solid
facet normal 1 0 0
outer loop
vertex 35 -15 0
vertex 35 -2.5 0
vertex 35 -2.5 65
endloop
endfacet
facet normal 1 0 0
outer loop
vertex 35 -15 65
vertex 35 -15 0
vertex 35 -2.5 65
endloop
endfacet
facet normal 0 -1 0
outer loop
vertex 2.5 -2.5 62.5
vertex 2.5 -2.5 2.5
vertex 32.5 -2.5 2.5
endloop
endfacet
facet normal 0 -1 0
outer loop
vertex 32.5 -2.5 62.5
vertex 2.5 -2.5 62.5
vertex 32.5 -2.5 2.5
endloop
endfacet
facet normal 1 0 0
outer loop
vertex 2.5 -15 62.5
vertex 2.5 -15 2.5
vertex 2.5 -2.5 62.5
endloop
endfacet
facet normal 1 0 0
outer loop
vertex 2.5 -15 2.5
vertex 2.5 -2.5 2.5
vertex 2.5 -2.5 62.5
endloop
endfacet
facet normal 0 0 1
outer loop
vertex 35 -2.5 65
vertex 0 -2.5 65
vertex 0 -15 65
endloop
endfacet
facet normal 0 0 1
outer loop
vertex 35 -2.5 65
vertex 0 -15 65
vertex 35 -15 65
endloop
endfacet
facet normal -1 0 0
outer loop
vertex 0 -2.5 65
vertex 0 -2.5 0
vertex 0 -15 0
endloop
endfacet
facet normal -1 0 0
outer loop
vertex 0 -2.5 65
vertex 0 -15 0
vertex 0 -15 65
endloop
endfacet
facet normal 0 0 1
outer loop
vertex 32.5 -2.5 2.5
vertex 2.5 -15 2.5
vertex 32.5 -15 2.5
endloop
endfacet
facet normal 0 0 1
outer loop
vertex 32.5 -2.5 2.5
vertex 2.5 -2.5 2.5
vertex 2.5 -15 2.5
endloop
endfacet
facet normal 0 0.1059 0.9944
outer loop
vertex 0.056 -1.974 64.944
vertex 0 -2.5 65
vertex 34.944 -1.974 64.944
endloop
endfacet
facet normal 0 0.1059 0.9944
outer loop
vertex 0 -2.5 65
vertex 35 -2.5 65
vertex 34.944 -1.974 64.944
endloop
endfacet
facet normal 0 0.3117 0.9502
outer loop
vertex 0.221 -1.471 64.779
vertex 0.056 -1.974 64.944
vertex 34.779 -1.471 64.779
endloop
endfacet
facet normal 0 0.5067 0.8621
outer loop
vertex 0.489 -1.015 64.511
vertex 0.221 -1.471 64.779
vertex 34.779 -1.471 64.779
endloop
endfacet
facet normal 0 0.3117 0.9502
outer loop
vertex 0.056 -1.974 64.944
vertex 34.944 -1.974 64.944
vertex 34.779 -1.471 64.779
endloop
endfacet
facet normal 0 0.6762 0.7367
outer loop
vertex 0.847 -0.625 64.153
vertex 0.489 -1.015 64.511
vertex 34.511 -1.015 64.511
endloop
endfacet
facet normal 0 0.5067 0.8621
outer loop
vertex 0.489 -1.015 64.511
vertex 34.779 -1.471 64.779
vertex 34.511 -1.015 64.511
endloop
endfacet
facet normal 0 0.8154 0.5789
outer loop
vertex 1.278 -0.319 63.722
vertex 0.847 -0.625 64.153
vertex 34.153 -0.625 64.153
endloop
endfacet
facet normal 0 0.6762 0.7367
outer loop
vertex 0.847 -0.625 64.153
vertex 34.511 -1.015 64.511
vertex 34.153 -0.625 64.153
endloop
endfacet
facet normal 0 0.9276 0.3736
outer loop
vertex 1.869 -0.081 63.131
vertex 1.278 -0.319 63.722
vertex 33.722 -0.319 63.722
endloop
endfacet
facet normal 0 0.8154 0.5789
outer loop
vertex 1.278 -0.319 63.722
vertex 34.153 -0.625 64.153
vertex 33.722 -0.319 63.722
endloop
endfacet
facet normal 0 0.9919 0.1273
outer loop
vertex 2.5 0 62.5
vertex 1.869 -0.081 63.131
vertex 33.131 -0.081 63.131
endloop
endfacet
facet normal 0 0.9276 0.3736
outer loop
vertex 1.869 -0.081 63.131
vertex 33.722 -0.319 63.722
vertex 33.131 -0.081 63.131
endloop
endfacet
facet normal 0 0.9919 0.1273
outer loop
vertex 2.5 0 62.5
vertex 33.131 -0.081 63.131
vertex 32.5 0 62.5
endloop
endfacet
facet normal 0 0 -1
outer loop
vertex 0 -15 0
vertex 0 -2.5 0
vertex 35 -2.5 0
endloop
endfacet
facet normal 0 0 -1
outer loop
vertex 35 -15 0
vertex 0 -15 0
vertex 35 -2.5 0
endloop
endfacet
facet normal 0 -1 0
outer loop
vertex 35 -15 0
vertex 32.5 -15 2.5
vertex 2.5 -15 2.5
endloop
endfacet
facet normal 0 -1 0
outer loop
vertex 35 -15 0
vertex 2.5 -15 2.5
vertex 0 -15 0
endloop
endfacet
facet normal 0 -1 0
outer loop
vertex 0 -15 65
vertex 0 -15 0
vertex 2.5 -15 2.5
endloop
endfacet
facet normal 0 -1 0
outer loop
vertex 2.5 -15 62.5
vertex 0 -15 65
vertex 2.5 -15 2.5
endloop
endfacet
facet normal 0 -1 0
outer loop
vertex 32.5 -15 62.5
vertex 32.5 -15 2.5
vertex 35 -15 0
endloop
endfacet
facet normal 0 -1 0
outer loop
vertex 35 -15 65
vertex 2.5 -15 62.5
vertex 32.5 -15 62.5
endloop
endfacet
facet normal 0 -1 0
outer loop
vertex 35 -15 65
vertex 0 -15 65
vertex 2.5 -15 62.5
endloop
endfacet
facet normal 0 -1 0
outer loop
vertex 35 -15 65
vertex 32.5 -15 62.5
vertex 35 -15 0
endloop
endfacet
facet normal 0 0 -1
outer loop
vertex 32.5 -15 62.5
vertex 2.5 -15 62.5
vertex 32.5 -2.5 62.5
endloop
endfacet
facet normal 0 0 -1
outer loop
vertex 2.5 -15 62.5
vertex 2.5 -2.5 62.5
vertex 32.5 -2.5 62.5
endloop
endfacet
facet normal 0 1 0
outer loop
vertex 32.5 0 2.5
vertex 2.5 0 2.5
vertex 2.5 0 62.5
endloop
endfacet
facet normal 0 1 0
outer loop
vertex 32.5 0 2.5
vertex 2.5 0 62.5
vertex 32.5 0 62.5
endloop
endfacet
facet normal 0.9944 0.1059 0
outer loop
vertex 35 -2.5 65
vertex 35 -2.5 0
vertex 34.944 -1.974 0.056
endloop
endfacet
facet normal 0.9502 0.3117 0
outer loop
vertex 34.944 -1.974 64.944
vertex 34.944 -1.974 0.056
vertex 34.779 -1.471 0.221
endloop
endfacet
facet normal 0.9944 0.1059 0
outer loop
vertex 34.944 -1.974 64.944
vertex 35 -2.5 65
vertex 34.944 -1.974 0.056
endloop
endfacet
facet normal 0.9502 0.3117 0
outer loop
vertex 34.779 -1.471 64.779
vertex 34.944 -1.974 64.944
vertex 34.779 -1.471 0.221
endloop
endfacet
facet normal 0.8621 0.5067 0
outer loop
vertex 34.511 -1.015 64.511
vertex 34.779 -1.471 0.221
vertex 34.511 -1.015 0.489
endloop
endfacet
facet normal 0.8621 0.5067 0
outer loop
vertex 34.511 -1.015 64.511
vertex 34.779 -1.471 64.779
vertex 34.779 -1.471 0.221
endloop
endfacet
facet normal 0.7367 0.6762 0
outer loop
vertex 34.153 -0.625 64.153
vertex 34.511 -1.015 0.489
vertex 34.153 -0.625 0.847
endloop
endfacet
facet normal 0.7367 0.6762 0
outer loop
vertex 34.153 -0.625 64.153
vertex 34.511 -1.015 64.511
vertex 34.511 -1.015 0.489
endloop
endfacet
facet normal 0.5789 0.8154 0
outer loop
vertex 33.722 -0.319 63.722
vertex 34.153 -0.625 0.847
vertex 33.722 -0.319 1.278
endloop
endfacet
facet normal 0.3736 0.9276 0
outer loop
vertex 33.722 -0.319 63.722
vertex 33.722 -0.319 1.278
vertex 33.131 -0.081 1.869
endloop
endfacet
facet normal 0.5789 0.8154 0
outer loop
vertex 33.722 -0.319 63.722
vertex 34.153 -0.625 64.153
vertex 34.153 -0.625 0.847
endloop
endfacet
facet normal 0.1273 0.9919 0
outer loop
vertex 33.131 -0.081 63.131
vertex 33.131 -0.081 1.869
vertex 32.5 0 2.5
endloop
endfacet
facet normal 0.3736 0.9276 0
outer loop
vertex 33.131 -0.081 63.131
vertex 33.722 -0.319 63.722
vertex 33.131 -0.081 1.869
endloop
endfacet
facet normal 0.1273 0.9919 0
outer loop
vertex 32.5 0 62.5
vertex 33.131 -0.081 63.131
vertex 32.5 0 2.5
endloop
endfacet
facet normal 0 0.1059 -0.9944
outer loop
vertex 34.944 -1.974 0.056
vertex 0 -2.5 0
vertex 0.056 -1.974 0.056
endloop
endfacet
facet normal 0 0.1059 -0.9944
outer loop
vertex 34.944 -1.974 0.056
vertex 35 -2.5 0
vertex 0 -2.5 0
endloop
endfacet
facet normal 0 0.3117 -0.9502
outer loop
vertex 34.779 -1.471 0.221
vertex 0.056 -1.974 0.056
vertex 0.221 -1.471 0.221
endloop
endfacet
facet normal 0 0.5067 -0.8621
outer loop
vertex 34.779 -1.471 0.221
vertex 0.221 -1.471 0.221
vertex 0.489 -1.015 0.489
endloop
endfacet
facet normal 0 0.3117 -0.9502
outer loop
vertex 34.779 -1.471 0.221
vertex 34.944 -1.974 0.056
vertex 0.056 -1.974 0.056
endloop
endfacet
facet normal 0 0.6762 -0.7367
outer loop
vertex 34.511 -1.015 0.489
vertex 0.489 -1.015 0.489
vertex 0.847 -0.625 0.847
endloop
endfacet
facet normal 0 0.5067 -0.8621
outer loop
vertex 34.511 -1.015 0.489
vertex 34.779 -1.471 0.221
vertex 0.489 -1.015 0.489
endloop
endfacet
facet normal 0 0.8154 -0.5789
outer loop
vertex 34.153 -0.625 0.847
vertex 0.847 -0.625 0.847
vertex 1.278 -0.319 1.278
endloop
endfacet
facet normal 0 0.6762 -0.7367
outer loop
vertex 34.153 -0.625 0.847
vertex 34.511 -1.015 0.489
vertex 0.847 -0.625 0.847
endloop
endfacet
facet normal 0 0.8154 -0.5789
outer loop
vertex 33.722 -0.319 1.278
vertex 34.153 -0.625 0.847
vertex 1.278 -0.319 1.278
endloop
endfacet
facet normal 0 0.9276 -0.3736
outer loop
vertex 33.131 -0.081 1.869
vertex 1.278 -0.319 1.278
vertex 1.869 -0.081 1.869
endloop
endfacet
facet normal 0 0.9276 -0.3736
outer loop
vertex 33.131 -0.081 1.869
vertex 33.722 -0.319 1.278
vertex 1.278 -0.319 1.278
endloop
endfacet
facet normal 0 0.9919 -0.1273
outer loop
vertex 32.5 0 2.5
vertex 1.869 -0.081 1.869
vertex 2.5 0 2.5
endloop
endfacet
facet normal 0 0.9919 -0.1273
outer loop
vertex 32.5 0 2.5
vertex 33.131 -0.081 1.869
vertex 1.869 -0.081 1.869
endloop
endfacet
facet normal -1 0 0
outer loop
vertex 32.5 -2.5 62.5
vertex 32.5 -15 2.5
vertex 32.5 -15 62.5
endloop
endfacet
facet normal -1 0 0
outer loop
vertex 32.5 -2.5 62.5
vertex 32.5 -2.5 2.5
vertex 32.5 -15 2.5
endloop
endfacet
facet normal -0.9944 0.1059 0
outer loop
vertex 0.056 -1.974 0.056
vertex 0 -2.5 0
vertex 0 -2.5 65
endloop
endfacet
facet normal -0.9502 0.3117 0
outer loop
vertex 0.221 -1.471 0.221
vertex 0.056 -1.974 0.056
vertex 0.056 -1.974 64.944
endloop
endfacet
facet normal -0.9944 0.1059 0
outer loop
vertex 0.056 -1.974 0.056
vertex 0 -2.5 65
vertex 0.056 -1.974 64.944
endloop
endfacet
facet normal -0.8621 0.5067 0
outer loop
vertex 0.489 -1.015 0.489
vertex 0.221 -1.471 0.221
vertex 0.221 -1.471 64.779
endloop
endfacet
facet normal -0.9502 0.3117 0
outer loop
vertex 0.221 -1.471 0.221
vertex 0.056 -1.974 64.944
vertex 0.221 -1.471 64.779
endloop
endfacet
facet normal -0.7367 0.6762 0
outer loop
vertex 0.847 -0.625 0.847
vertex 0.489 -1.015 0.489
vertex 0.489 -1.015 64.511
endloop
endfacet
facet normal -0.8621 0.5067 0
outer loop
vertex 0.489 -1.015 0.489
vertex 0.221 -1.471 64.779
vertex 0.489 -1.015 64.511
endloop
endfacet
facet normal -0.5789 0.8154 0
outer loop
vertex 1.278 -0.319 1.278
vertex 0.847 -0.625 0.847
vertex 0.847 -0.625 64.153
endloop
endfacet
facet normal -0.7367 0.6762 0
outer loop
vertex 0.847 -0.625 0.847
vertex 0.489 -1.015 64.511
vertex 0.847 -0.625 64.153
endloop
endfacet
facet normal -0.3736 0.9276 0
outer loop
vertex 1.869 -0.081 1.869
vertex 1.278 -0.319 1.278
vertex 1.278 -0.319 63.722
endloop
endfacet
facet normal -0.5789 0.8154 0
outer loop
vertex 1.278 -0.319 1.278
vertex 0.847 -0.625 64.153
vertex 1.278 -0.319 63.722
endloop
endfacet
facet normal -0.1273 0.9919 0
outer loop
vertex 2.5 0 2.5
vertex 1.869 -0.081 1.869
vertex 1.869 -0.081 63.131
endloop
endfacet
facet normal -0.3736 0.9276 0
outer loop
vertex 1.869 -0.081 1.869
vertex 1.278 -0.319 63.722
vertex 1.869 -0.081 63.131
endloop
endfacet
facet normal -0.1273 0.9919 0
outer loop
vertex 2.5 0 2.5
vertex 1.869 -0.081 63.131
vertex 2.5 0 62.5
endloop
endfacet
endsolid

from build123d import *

# Parameters (mm, degrees)
F0_W     = 35
F0_H     = 65
F1_DEPTH = 15
F2_T     = -2.5
F3_R     = 2.5


with BuildPart() as f1:
    # F0 (on Front) → F1 (new body)
    with BuildSketch(Plane.XZ):
        with Locations((17.5, 32.5)):
            Rectangle(F0_W, F0_H)
    extrude(amount=F1_DEPTH)

    # F2
    f2_openings = [f1.faces().sort_by_distance(p)[0] for p in [
        (17.5, -15, 32.5),
    ]]
    offset(amount=F2_T, openings=f2_openings)

    # F3
    f3_edges = [f1.edges().sort_by_distance(p)[0] for p in [
        (0, 0, 32.5),
        (17.5, 0, 0),
        (35, 0, 32.5),
        (17.5, 0, 65),
    ]]
    fillet(f3_edges, radius=F3_R)


solid = f1.part
